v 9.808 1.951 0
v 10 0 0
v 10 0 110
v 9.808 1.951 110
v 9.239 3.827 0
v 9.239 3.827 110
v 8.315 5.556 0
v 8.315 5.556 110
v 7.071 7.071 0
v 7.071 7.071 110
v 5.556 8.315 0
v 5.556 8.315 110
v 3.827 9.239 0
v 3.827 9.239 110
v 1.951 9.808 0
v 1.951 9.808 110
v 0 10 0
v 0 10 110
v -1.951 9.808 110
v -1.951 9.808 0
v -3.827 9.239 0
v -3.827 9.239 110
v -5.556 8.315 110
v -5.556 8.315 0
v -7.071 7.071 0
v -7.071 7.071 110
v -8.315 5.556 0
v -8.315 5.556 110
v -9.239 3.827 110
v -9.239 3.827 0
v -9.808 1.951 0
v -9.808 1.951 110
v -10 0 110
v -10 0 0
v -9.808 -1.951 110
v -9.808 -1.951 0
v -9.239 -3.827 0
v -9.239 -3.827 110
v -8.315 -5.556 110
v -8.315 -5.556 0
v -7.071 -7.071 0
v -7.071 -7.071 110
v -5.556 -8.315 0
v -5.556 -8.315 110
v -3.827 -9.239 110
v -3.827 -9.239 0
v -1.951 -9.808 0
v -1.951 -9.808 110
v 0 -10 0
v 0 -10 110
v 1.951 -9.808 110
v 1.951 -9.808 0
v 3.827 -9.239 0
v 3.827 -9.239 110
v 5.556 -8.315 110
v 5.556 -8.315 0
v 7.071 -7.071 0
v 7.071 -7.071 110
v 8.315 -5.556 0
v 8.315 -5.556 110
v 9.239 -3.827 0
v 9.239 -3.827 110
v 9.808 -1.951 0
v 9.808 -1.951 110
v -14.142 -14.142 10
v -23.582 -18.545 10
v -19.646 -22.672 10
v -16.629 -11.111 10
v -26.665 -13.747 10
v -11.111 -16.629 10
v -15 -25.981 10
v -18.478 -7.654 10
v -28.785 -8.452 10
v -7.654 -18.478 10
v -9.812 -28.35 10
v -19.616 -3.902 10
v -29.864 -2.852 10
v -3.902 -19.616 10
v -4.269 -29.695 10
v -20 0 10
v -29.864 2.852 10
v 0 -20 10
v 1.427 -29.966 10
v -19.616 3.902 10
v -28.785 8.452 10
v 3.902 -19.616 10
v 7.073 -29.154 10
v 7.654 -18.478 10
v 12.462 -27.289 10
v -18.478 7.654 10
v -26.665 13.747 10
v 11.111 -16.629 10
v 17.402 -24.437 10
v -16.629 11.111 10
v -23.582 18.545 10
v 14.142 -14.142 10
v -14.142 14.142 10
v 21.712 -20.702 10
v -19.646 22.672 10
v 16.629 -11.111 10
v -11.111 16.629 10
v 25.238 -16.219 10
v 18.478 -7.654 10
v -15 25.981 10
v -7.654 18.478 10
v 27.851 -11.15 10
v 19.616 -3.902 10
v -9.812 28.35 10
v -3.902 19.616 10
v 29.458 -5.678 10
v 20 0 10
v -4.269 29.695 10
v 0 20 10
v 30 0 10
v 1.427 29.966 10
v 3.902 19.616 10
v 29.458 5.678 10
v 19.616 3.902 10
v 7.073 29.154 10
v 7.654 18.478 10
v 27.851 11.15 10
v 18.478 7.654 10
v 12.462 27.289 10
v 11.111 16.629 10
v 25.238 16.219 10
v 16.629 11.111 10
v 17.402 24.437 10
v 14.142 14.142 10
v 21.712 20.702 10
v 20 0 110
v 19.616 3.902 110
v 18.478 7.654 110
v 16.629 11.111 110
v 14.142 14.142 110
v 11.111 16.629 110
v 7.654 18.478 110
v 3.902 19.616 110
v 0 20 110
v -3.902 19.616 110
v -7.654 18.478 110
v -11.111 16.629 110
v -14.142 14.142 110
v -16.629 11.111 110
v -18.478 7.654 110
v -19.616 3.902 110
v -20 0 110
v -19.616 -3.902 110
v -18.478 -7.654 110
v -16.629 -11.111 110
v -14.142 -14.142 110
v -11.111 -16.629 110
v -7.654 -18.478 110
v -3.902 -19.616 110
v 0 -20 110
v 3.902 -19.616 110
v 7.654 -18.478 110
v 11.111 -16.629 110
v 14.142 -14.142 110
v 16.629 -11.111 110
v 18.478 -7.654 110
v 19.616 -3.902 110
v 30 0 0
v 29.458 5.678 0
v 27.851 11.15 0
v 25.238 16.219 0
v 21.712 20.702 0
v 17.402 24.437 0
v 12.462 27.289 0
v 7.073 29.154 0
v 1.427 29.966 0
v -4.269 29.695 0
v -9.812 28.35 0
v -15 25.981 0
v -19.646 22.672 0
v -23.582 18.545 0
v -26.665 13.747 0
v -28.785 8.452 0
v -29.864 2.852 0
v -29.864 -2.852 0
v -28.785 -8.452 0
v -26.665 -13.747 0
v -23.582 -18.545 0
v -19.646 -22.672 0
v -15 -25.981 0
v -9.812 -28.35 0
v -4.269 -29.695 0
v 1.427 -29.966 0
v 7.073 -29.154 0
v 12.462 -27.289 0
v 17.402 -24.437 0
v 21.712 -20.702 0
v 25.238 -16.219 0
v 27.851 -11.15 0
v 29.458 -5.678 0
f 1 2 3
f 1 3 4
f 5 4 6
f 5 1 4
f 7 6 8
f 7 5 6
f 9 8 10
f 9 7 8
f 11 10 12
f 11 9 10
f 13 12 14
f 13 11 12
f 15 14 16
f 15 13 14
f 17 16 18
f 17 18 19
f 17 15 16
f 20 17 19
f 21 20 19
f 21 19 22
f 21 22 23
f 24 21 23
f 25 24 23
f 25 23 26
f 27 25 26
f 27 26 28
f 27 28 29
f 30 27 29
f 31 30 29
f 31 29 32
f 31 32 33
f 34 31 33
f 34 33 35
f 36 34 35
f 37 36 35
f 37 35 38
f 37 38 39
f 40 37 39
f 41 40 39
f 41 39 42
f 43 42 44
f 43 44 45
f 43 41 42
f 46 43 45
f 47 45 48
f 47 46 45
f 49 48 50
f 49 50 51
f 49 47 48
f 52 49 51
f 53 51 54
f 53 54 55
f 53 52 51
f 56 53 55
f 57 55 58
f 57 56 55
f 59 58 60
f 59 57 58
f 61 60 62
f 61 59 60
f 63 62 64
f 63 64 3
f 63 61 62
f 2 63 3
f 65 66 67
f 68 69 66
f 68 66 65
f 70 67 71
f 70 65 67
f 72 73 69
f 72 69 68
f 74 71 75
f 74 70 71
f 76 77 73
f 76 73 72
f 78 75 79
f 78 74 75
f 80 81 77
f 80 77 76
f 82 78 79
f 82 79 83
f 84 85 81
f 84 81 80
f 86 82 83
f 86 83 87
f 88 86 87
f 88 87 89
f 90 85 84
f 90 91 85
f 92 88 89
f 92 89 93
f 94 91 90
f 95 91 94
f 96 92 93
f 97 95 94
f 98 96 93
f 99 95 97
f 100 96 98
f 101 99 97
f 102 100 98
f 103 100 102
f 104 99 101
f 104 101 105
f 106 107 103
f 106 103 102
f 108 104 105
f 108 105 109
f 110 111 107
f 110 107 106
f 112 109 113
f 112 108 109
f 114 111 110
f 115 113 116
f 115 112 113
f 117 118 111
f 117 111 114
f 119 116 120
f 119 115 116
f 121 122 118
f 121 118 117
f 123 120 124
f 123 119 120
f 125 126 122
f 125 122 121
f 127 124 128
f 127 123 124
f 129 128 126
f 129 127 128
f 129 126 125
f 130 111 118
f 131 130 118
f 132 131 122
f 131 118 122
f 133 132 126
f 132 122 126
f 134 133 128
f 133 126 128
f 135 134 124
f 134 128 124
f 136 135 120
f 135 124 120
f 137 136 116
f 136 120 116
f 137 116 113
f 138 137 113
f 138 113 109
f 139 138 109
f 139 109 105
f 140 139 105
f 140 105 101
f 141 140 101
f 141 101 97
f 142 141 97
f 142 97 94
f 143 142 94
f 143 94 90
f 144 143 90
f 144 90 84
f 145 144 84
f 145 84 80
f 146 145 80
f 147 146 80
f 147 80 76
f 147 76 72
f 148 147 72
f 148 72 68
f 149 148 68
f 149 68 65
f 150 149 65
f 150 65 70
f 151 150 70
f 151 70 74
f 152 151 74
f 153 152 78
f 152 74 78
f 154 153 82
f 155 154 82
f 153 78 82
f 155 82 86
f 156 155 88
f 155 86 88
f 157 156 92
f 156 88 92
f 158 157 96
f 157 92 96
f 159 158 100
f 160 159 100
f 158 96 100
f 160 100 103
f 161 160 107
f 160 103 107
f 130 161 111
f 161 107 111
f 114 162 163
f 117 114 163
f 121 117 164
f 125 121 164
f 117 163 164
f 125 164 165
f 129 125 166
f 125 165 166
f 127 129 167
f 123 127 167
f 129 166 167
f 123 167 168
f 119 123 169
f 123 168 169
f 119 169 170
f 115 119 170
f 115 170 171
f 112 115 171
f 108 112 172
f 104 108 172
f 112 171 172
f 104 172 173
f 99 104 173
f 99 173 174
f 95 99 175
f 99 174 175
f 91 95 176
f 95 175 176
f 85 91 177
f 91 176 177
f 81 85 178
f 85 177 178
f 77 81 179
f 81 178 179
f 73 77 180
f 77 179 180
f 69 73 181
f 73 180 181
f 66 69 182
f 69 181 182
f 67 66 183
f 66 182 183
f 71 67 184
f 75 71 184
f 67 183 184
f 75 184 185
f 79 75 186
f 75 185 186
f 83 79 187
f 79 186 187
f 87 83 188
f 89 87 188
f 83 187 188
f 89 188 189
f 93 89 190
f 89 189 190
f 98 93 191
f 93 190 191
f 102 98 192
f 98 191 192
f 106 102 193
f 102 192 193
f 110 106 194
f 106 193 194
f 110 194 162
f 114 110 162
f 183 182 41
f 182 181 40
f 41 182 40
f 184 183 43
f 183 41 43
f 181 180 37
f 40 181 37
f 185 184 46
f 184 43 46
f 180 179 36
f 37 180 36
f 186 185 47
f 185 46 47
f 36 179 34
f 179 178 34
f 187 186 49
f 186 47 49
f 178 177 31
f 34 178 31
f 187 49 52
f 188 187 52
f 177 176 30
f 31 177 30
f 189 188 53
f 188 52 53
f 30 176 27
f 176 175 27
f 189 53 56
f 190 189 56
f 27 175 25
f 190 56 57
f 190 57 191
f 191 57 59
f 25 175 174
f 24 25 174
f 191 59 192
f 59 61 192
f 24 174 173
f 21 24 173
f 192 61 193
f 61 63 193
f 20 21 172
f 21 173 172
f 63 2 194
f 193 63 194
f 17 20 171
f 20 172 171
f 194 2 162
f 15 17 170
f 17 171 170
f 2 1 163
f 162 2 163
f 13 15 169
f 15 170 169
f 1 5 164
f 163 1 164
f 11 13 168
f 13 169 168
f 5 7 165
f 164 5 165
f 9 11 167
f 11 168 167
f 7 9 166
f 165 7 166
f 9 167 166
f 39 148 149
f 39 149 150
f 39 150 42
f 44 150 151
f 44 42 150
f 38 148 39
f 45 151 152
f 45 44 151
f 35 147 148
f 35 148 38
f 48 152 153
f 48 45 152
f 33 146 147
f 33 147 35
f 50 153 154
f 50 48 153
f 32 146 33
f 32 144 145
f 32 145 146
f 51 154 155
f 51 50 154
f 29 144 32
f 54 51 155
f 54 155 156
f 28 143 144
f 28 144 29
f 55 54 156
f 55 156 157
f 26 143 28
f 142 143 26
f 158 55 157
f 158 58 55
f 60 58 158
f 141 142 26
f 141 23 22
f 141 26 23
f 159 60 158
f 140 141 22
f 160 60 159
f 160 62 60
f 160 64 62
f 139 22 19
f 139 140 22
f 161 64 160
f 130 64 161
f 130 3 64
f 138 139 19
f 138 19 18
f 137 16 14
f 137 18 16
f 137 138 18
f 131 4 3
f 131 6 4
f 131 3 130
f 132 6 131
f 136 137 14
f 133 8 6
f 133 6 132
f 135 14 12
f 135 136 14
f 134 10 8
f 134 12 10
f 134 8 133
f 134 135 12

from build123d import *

# Parameters (mm, degrees)
SKETCH2_R           = 20
SKETCH2_R_2         = 10
BOSS_EXTRUDE1_DEPTH = 110
SKETCH3_R           = 30
BOSS_EXTRUDE2_DEPTH = 10
CUT_EXTRUDE1_START  = -10
SKETCH4_R           = 10
CUT_EXTRUDE1_DEPTH  = 10


with BuildPart() as part:
    # Sketch2 → Boss-Extrude1 (new body)
    with BuildSketch(Plane(origin=(0, 0, 0), x_dir=(0, 1, 0), z_dir=(0, 0, 1))):
        with Locations(Location((0, 0, 0), (0, 0, 270))):
            Circle(SKETCH2_R)
        with Locations(Location((0, 0, 0), (0, 0, 270))):
            Circle(SKETCH2_R_2, mode=Mode.SUBTRACT)
    extrude(amount=BOSS_EXTRUDE1_DEPTH)

    # Sketch3 → Boss-Extrude2 (add)
    with BuildSketch(Plane(origin=(0, 0, 0), x_dir=(0, 1, 0), z_dir=(0, 0, 1))):
        with Locations(Location((0, 0, 0), (0, 0, 270))):
            Circle(SKETCH3_R)
    extrude(amount=BOSS_EXTRUDE2_DEPTH)

    # Sketch4 → Cut-Extrude1 (cut)
    with BuildSketch(Plane.XY.offset(10).offset(CUT_EXTRUDE1_START)):
        Circle(SKETCH4_R)
    extrude(amount=CUT_EXTRUDE1_DEPTH, mode=Mode.SUBTRACT)


solid = part.part
